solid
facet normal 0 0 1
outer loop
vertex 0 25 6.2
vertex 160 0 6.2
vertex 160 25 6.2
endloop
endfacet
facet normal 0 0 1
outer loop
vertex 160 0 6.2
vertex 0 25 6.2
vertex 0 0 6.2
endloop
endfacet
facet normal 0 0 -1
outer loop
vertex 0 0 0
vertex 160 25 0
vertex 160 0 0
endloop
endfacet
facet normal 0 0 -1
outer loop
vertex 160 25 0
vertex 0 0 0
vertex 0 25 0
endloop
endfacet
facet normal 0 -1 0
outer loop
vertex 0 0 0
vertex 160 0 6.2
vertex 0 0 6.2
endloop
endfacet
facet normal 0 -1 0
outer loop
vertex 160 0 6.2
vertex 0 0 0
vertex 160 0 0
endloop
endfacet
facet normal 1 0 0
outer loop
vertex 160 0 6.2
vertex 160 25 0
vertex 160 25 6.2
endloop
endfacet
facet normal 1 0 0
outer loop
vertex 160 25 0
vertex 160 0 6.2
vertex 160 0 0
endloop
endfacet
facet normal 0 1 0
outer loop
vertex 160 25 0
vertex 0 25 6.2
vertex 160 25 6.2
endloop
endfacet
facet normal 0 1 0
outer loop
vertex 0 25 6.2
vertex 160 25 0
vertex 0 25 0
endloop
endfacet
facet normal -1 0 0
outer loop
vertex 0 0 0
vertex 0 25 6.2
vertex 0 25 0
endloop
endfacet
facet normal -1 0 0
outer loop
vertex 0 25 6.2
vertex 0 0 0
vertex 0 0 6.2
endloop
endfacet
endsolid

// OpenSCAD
// ScienceClaw solid_bar; nominal millimeters. Printer process requires validation.
length = 160;
width = 25;
height = 6.2;
thickness = 1.2;
difference() { cube([length,width,height]);  }
